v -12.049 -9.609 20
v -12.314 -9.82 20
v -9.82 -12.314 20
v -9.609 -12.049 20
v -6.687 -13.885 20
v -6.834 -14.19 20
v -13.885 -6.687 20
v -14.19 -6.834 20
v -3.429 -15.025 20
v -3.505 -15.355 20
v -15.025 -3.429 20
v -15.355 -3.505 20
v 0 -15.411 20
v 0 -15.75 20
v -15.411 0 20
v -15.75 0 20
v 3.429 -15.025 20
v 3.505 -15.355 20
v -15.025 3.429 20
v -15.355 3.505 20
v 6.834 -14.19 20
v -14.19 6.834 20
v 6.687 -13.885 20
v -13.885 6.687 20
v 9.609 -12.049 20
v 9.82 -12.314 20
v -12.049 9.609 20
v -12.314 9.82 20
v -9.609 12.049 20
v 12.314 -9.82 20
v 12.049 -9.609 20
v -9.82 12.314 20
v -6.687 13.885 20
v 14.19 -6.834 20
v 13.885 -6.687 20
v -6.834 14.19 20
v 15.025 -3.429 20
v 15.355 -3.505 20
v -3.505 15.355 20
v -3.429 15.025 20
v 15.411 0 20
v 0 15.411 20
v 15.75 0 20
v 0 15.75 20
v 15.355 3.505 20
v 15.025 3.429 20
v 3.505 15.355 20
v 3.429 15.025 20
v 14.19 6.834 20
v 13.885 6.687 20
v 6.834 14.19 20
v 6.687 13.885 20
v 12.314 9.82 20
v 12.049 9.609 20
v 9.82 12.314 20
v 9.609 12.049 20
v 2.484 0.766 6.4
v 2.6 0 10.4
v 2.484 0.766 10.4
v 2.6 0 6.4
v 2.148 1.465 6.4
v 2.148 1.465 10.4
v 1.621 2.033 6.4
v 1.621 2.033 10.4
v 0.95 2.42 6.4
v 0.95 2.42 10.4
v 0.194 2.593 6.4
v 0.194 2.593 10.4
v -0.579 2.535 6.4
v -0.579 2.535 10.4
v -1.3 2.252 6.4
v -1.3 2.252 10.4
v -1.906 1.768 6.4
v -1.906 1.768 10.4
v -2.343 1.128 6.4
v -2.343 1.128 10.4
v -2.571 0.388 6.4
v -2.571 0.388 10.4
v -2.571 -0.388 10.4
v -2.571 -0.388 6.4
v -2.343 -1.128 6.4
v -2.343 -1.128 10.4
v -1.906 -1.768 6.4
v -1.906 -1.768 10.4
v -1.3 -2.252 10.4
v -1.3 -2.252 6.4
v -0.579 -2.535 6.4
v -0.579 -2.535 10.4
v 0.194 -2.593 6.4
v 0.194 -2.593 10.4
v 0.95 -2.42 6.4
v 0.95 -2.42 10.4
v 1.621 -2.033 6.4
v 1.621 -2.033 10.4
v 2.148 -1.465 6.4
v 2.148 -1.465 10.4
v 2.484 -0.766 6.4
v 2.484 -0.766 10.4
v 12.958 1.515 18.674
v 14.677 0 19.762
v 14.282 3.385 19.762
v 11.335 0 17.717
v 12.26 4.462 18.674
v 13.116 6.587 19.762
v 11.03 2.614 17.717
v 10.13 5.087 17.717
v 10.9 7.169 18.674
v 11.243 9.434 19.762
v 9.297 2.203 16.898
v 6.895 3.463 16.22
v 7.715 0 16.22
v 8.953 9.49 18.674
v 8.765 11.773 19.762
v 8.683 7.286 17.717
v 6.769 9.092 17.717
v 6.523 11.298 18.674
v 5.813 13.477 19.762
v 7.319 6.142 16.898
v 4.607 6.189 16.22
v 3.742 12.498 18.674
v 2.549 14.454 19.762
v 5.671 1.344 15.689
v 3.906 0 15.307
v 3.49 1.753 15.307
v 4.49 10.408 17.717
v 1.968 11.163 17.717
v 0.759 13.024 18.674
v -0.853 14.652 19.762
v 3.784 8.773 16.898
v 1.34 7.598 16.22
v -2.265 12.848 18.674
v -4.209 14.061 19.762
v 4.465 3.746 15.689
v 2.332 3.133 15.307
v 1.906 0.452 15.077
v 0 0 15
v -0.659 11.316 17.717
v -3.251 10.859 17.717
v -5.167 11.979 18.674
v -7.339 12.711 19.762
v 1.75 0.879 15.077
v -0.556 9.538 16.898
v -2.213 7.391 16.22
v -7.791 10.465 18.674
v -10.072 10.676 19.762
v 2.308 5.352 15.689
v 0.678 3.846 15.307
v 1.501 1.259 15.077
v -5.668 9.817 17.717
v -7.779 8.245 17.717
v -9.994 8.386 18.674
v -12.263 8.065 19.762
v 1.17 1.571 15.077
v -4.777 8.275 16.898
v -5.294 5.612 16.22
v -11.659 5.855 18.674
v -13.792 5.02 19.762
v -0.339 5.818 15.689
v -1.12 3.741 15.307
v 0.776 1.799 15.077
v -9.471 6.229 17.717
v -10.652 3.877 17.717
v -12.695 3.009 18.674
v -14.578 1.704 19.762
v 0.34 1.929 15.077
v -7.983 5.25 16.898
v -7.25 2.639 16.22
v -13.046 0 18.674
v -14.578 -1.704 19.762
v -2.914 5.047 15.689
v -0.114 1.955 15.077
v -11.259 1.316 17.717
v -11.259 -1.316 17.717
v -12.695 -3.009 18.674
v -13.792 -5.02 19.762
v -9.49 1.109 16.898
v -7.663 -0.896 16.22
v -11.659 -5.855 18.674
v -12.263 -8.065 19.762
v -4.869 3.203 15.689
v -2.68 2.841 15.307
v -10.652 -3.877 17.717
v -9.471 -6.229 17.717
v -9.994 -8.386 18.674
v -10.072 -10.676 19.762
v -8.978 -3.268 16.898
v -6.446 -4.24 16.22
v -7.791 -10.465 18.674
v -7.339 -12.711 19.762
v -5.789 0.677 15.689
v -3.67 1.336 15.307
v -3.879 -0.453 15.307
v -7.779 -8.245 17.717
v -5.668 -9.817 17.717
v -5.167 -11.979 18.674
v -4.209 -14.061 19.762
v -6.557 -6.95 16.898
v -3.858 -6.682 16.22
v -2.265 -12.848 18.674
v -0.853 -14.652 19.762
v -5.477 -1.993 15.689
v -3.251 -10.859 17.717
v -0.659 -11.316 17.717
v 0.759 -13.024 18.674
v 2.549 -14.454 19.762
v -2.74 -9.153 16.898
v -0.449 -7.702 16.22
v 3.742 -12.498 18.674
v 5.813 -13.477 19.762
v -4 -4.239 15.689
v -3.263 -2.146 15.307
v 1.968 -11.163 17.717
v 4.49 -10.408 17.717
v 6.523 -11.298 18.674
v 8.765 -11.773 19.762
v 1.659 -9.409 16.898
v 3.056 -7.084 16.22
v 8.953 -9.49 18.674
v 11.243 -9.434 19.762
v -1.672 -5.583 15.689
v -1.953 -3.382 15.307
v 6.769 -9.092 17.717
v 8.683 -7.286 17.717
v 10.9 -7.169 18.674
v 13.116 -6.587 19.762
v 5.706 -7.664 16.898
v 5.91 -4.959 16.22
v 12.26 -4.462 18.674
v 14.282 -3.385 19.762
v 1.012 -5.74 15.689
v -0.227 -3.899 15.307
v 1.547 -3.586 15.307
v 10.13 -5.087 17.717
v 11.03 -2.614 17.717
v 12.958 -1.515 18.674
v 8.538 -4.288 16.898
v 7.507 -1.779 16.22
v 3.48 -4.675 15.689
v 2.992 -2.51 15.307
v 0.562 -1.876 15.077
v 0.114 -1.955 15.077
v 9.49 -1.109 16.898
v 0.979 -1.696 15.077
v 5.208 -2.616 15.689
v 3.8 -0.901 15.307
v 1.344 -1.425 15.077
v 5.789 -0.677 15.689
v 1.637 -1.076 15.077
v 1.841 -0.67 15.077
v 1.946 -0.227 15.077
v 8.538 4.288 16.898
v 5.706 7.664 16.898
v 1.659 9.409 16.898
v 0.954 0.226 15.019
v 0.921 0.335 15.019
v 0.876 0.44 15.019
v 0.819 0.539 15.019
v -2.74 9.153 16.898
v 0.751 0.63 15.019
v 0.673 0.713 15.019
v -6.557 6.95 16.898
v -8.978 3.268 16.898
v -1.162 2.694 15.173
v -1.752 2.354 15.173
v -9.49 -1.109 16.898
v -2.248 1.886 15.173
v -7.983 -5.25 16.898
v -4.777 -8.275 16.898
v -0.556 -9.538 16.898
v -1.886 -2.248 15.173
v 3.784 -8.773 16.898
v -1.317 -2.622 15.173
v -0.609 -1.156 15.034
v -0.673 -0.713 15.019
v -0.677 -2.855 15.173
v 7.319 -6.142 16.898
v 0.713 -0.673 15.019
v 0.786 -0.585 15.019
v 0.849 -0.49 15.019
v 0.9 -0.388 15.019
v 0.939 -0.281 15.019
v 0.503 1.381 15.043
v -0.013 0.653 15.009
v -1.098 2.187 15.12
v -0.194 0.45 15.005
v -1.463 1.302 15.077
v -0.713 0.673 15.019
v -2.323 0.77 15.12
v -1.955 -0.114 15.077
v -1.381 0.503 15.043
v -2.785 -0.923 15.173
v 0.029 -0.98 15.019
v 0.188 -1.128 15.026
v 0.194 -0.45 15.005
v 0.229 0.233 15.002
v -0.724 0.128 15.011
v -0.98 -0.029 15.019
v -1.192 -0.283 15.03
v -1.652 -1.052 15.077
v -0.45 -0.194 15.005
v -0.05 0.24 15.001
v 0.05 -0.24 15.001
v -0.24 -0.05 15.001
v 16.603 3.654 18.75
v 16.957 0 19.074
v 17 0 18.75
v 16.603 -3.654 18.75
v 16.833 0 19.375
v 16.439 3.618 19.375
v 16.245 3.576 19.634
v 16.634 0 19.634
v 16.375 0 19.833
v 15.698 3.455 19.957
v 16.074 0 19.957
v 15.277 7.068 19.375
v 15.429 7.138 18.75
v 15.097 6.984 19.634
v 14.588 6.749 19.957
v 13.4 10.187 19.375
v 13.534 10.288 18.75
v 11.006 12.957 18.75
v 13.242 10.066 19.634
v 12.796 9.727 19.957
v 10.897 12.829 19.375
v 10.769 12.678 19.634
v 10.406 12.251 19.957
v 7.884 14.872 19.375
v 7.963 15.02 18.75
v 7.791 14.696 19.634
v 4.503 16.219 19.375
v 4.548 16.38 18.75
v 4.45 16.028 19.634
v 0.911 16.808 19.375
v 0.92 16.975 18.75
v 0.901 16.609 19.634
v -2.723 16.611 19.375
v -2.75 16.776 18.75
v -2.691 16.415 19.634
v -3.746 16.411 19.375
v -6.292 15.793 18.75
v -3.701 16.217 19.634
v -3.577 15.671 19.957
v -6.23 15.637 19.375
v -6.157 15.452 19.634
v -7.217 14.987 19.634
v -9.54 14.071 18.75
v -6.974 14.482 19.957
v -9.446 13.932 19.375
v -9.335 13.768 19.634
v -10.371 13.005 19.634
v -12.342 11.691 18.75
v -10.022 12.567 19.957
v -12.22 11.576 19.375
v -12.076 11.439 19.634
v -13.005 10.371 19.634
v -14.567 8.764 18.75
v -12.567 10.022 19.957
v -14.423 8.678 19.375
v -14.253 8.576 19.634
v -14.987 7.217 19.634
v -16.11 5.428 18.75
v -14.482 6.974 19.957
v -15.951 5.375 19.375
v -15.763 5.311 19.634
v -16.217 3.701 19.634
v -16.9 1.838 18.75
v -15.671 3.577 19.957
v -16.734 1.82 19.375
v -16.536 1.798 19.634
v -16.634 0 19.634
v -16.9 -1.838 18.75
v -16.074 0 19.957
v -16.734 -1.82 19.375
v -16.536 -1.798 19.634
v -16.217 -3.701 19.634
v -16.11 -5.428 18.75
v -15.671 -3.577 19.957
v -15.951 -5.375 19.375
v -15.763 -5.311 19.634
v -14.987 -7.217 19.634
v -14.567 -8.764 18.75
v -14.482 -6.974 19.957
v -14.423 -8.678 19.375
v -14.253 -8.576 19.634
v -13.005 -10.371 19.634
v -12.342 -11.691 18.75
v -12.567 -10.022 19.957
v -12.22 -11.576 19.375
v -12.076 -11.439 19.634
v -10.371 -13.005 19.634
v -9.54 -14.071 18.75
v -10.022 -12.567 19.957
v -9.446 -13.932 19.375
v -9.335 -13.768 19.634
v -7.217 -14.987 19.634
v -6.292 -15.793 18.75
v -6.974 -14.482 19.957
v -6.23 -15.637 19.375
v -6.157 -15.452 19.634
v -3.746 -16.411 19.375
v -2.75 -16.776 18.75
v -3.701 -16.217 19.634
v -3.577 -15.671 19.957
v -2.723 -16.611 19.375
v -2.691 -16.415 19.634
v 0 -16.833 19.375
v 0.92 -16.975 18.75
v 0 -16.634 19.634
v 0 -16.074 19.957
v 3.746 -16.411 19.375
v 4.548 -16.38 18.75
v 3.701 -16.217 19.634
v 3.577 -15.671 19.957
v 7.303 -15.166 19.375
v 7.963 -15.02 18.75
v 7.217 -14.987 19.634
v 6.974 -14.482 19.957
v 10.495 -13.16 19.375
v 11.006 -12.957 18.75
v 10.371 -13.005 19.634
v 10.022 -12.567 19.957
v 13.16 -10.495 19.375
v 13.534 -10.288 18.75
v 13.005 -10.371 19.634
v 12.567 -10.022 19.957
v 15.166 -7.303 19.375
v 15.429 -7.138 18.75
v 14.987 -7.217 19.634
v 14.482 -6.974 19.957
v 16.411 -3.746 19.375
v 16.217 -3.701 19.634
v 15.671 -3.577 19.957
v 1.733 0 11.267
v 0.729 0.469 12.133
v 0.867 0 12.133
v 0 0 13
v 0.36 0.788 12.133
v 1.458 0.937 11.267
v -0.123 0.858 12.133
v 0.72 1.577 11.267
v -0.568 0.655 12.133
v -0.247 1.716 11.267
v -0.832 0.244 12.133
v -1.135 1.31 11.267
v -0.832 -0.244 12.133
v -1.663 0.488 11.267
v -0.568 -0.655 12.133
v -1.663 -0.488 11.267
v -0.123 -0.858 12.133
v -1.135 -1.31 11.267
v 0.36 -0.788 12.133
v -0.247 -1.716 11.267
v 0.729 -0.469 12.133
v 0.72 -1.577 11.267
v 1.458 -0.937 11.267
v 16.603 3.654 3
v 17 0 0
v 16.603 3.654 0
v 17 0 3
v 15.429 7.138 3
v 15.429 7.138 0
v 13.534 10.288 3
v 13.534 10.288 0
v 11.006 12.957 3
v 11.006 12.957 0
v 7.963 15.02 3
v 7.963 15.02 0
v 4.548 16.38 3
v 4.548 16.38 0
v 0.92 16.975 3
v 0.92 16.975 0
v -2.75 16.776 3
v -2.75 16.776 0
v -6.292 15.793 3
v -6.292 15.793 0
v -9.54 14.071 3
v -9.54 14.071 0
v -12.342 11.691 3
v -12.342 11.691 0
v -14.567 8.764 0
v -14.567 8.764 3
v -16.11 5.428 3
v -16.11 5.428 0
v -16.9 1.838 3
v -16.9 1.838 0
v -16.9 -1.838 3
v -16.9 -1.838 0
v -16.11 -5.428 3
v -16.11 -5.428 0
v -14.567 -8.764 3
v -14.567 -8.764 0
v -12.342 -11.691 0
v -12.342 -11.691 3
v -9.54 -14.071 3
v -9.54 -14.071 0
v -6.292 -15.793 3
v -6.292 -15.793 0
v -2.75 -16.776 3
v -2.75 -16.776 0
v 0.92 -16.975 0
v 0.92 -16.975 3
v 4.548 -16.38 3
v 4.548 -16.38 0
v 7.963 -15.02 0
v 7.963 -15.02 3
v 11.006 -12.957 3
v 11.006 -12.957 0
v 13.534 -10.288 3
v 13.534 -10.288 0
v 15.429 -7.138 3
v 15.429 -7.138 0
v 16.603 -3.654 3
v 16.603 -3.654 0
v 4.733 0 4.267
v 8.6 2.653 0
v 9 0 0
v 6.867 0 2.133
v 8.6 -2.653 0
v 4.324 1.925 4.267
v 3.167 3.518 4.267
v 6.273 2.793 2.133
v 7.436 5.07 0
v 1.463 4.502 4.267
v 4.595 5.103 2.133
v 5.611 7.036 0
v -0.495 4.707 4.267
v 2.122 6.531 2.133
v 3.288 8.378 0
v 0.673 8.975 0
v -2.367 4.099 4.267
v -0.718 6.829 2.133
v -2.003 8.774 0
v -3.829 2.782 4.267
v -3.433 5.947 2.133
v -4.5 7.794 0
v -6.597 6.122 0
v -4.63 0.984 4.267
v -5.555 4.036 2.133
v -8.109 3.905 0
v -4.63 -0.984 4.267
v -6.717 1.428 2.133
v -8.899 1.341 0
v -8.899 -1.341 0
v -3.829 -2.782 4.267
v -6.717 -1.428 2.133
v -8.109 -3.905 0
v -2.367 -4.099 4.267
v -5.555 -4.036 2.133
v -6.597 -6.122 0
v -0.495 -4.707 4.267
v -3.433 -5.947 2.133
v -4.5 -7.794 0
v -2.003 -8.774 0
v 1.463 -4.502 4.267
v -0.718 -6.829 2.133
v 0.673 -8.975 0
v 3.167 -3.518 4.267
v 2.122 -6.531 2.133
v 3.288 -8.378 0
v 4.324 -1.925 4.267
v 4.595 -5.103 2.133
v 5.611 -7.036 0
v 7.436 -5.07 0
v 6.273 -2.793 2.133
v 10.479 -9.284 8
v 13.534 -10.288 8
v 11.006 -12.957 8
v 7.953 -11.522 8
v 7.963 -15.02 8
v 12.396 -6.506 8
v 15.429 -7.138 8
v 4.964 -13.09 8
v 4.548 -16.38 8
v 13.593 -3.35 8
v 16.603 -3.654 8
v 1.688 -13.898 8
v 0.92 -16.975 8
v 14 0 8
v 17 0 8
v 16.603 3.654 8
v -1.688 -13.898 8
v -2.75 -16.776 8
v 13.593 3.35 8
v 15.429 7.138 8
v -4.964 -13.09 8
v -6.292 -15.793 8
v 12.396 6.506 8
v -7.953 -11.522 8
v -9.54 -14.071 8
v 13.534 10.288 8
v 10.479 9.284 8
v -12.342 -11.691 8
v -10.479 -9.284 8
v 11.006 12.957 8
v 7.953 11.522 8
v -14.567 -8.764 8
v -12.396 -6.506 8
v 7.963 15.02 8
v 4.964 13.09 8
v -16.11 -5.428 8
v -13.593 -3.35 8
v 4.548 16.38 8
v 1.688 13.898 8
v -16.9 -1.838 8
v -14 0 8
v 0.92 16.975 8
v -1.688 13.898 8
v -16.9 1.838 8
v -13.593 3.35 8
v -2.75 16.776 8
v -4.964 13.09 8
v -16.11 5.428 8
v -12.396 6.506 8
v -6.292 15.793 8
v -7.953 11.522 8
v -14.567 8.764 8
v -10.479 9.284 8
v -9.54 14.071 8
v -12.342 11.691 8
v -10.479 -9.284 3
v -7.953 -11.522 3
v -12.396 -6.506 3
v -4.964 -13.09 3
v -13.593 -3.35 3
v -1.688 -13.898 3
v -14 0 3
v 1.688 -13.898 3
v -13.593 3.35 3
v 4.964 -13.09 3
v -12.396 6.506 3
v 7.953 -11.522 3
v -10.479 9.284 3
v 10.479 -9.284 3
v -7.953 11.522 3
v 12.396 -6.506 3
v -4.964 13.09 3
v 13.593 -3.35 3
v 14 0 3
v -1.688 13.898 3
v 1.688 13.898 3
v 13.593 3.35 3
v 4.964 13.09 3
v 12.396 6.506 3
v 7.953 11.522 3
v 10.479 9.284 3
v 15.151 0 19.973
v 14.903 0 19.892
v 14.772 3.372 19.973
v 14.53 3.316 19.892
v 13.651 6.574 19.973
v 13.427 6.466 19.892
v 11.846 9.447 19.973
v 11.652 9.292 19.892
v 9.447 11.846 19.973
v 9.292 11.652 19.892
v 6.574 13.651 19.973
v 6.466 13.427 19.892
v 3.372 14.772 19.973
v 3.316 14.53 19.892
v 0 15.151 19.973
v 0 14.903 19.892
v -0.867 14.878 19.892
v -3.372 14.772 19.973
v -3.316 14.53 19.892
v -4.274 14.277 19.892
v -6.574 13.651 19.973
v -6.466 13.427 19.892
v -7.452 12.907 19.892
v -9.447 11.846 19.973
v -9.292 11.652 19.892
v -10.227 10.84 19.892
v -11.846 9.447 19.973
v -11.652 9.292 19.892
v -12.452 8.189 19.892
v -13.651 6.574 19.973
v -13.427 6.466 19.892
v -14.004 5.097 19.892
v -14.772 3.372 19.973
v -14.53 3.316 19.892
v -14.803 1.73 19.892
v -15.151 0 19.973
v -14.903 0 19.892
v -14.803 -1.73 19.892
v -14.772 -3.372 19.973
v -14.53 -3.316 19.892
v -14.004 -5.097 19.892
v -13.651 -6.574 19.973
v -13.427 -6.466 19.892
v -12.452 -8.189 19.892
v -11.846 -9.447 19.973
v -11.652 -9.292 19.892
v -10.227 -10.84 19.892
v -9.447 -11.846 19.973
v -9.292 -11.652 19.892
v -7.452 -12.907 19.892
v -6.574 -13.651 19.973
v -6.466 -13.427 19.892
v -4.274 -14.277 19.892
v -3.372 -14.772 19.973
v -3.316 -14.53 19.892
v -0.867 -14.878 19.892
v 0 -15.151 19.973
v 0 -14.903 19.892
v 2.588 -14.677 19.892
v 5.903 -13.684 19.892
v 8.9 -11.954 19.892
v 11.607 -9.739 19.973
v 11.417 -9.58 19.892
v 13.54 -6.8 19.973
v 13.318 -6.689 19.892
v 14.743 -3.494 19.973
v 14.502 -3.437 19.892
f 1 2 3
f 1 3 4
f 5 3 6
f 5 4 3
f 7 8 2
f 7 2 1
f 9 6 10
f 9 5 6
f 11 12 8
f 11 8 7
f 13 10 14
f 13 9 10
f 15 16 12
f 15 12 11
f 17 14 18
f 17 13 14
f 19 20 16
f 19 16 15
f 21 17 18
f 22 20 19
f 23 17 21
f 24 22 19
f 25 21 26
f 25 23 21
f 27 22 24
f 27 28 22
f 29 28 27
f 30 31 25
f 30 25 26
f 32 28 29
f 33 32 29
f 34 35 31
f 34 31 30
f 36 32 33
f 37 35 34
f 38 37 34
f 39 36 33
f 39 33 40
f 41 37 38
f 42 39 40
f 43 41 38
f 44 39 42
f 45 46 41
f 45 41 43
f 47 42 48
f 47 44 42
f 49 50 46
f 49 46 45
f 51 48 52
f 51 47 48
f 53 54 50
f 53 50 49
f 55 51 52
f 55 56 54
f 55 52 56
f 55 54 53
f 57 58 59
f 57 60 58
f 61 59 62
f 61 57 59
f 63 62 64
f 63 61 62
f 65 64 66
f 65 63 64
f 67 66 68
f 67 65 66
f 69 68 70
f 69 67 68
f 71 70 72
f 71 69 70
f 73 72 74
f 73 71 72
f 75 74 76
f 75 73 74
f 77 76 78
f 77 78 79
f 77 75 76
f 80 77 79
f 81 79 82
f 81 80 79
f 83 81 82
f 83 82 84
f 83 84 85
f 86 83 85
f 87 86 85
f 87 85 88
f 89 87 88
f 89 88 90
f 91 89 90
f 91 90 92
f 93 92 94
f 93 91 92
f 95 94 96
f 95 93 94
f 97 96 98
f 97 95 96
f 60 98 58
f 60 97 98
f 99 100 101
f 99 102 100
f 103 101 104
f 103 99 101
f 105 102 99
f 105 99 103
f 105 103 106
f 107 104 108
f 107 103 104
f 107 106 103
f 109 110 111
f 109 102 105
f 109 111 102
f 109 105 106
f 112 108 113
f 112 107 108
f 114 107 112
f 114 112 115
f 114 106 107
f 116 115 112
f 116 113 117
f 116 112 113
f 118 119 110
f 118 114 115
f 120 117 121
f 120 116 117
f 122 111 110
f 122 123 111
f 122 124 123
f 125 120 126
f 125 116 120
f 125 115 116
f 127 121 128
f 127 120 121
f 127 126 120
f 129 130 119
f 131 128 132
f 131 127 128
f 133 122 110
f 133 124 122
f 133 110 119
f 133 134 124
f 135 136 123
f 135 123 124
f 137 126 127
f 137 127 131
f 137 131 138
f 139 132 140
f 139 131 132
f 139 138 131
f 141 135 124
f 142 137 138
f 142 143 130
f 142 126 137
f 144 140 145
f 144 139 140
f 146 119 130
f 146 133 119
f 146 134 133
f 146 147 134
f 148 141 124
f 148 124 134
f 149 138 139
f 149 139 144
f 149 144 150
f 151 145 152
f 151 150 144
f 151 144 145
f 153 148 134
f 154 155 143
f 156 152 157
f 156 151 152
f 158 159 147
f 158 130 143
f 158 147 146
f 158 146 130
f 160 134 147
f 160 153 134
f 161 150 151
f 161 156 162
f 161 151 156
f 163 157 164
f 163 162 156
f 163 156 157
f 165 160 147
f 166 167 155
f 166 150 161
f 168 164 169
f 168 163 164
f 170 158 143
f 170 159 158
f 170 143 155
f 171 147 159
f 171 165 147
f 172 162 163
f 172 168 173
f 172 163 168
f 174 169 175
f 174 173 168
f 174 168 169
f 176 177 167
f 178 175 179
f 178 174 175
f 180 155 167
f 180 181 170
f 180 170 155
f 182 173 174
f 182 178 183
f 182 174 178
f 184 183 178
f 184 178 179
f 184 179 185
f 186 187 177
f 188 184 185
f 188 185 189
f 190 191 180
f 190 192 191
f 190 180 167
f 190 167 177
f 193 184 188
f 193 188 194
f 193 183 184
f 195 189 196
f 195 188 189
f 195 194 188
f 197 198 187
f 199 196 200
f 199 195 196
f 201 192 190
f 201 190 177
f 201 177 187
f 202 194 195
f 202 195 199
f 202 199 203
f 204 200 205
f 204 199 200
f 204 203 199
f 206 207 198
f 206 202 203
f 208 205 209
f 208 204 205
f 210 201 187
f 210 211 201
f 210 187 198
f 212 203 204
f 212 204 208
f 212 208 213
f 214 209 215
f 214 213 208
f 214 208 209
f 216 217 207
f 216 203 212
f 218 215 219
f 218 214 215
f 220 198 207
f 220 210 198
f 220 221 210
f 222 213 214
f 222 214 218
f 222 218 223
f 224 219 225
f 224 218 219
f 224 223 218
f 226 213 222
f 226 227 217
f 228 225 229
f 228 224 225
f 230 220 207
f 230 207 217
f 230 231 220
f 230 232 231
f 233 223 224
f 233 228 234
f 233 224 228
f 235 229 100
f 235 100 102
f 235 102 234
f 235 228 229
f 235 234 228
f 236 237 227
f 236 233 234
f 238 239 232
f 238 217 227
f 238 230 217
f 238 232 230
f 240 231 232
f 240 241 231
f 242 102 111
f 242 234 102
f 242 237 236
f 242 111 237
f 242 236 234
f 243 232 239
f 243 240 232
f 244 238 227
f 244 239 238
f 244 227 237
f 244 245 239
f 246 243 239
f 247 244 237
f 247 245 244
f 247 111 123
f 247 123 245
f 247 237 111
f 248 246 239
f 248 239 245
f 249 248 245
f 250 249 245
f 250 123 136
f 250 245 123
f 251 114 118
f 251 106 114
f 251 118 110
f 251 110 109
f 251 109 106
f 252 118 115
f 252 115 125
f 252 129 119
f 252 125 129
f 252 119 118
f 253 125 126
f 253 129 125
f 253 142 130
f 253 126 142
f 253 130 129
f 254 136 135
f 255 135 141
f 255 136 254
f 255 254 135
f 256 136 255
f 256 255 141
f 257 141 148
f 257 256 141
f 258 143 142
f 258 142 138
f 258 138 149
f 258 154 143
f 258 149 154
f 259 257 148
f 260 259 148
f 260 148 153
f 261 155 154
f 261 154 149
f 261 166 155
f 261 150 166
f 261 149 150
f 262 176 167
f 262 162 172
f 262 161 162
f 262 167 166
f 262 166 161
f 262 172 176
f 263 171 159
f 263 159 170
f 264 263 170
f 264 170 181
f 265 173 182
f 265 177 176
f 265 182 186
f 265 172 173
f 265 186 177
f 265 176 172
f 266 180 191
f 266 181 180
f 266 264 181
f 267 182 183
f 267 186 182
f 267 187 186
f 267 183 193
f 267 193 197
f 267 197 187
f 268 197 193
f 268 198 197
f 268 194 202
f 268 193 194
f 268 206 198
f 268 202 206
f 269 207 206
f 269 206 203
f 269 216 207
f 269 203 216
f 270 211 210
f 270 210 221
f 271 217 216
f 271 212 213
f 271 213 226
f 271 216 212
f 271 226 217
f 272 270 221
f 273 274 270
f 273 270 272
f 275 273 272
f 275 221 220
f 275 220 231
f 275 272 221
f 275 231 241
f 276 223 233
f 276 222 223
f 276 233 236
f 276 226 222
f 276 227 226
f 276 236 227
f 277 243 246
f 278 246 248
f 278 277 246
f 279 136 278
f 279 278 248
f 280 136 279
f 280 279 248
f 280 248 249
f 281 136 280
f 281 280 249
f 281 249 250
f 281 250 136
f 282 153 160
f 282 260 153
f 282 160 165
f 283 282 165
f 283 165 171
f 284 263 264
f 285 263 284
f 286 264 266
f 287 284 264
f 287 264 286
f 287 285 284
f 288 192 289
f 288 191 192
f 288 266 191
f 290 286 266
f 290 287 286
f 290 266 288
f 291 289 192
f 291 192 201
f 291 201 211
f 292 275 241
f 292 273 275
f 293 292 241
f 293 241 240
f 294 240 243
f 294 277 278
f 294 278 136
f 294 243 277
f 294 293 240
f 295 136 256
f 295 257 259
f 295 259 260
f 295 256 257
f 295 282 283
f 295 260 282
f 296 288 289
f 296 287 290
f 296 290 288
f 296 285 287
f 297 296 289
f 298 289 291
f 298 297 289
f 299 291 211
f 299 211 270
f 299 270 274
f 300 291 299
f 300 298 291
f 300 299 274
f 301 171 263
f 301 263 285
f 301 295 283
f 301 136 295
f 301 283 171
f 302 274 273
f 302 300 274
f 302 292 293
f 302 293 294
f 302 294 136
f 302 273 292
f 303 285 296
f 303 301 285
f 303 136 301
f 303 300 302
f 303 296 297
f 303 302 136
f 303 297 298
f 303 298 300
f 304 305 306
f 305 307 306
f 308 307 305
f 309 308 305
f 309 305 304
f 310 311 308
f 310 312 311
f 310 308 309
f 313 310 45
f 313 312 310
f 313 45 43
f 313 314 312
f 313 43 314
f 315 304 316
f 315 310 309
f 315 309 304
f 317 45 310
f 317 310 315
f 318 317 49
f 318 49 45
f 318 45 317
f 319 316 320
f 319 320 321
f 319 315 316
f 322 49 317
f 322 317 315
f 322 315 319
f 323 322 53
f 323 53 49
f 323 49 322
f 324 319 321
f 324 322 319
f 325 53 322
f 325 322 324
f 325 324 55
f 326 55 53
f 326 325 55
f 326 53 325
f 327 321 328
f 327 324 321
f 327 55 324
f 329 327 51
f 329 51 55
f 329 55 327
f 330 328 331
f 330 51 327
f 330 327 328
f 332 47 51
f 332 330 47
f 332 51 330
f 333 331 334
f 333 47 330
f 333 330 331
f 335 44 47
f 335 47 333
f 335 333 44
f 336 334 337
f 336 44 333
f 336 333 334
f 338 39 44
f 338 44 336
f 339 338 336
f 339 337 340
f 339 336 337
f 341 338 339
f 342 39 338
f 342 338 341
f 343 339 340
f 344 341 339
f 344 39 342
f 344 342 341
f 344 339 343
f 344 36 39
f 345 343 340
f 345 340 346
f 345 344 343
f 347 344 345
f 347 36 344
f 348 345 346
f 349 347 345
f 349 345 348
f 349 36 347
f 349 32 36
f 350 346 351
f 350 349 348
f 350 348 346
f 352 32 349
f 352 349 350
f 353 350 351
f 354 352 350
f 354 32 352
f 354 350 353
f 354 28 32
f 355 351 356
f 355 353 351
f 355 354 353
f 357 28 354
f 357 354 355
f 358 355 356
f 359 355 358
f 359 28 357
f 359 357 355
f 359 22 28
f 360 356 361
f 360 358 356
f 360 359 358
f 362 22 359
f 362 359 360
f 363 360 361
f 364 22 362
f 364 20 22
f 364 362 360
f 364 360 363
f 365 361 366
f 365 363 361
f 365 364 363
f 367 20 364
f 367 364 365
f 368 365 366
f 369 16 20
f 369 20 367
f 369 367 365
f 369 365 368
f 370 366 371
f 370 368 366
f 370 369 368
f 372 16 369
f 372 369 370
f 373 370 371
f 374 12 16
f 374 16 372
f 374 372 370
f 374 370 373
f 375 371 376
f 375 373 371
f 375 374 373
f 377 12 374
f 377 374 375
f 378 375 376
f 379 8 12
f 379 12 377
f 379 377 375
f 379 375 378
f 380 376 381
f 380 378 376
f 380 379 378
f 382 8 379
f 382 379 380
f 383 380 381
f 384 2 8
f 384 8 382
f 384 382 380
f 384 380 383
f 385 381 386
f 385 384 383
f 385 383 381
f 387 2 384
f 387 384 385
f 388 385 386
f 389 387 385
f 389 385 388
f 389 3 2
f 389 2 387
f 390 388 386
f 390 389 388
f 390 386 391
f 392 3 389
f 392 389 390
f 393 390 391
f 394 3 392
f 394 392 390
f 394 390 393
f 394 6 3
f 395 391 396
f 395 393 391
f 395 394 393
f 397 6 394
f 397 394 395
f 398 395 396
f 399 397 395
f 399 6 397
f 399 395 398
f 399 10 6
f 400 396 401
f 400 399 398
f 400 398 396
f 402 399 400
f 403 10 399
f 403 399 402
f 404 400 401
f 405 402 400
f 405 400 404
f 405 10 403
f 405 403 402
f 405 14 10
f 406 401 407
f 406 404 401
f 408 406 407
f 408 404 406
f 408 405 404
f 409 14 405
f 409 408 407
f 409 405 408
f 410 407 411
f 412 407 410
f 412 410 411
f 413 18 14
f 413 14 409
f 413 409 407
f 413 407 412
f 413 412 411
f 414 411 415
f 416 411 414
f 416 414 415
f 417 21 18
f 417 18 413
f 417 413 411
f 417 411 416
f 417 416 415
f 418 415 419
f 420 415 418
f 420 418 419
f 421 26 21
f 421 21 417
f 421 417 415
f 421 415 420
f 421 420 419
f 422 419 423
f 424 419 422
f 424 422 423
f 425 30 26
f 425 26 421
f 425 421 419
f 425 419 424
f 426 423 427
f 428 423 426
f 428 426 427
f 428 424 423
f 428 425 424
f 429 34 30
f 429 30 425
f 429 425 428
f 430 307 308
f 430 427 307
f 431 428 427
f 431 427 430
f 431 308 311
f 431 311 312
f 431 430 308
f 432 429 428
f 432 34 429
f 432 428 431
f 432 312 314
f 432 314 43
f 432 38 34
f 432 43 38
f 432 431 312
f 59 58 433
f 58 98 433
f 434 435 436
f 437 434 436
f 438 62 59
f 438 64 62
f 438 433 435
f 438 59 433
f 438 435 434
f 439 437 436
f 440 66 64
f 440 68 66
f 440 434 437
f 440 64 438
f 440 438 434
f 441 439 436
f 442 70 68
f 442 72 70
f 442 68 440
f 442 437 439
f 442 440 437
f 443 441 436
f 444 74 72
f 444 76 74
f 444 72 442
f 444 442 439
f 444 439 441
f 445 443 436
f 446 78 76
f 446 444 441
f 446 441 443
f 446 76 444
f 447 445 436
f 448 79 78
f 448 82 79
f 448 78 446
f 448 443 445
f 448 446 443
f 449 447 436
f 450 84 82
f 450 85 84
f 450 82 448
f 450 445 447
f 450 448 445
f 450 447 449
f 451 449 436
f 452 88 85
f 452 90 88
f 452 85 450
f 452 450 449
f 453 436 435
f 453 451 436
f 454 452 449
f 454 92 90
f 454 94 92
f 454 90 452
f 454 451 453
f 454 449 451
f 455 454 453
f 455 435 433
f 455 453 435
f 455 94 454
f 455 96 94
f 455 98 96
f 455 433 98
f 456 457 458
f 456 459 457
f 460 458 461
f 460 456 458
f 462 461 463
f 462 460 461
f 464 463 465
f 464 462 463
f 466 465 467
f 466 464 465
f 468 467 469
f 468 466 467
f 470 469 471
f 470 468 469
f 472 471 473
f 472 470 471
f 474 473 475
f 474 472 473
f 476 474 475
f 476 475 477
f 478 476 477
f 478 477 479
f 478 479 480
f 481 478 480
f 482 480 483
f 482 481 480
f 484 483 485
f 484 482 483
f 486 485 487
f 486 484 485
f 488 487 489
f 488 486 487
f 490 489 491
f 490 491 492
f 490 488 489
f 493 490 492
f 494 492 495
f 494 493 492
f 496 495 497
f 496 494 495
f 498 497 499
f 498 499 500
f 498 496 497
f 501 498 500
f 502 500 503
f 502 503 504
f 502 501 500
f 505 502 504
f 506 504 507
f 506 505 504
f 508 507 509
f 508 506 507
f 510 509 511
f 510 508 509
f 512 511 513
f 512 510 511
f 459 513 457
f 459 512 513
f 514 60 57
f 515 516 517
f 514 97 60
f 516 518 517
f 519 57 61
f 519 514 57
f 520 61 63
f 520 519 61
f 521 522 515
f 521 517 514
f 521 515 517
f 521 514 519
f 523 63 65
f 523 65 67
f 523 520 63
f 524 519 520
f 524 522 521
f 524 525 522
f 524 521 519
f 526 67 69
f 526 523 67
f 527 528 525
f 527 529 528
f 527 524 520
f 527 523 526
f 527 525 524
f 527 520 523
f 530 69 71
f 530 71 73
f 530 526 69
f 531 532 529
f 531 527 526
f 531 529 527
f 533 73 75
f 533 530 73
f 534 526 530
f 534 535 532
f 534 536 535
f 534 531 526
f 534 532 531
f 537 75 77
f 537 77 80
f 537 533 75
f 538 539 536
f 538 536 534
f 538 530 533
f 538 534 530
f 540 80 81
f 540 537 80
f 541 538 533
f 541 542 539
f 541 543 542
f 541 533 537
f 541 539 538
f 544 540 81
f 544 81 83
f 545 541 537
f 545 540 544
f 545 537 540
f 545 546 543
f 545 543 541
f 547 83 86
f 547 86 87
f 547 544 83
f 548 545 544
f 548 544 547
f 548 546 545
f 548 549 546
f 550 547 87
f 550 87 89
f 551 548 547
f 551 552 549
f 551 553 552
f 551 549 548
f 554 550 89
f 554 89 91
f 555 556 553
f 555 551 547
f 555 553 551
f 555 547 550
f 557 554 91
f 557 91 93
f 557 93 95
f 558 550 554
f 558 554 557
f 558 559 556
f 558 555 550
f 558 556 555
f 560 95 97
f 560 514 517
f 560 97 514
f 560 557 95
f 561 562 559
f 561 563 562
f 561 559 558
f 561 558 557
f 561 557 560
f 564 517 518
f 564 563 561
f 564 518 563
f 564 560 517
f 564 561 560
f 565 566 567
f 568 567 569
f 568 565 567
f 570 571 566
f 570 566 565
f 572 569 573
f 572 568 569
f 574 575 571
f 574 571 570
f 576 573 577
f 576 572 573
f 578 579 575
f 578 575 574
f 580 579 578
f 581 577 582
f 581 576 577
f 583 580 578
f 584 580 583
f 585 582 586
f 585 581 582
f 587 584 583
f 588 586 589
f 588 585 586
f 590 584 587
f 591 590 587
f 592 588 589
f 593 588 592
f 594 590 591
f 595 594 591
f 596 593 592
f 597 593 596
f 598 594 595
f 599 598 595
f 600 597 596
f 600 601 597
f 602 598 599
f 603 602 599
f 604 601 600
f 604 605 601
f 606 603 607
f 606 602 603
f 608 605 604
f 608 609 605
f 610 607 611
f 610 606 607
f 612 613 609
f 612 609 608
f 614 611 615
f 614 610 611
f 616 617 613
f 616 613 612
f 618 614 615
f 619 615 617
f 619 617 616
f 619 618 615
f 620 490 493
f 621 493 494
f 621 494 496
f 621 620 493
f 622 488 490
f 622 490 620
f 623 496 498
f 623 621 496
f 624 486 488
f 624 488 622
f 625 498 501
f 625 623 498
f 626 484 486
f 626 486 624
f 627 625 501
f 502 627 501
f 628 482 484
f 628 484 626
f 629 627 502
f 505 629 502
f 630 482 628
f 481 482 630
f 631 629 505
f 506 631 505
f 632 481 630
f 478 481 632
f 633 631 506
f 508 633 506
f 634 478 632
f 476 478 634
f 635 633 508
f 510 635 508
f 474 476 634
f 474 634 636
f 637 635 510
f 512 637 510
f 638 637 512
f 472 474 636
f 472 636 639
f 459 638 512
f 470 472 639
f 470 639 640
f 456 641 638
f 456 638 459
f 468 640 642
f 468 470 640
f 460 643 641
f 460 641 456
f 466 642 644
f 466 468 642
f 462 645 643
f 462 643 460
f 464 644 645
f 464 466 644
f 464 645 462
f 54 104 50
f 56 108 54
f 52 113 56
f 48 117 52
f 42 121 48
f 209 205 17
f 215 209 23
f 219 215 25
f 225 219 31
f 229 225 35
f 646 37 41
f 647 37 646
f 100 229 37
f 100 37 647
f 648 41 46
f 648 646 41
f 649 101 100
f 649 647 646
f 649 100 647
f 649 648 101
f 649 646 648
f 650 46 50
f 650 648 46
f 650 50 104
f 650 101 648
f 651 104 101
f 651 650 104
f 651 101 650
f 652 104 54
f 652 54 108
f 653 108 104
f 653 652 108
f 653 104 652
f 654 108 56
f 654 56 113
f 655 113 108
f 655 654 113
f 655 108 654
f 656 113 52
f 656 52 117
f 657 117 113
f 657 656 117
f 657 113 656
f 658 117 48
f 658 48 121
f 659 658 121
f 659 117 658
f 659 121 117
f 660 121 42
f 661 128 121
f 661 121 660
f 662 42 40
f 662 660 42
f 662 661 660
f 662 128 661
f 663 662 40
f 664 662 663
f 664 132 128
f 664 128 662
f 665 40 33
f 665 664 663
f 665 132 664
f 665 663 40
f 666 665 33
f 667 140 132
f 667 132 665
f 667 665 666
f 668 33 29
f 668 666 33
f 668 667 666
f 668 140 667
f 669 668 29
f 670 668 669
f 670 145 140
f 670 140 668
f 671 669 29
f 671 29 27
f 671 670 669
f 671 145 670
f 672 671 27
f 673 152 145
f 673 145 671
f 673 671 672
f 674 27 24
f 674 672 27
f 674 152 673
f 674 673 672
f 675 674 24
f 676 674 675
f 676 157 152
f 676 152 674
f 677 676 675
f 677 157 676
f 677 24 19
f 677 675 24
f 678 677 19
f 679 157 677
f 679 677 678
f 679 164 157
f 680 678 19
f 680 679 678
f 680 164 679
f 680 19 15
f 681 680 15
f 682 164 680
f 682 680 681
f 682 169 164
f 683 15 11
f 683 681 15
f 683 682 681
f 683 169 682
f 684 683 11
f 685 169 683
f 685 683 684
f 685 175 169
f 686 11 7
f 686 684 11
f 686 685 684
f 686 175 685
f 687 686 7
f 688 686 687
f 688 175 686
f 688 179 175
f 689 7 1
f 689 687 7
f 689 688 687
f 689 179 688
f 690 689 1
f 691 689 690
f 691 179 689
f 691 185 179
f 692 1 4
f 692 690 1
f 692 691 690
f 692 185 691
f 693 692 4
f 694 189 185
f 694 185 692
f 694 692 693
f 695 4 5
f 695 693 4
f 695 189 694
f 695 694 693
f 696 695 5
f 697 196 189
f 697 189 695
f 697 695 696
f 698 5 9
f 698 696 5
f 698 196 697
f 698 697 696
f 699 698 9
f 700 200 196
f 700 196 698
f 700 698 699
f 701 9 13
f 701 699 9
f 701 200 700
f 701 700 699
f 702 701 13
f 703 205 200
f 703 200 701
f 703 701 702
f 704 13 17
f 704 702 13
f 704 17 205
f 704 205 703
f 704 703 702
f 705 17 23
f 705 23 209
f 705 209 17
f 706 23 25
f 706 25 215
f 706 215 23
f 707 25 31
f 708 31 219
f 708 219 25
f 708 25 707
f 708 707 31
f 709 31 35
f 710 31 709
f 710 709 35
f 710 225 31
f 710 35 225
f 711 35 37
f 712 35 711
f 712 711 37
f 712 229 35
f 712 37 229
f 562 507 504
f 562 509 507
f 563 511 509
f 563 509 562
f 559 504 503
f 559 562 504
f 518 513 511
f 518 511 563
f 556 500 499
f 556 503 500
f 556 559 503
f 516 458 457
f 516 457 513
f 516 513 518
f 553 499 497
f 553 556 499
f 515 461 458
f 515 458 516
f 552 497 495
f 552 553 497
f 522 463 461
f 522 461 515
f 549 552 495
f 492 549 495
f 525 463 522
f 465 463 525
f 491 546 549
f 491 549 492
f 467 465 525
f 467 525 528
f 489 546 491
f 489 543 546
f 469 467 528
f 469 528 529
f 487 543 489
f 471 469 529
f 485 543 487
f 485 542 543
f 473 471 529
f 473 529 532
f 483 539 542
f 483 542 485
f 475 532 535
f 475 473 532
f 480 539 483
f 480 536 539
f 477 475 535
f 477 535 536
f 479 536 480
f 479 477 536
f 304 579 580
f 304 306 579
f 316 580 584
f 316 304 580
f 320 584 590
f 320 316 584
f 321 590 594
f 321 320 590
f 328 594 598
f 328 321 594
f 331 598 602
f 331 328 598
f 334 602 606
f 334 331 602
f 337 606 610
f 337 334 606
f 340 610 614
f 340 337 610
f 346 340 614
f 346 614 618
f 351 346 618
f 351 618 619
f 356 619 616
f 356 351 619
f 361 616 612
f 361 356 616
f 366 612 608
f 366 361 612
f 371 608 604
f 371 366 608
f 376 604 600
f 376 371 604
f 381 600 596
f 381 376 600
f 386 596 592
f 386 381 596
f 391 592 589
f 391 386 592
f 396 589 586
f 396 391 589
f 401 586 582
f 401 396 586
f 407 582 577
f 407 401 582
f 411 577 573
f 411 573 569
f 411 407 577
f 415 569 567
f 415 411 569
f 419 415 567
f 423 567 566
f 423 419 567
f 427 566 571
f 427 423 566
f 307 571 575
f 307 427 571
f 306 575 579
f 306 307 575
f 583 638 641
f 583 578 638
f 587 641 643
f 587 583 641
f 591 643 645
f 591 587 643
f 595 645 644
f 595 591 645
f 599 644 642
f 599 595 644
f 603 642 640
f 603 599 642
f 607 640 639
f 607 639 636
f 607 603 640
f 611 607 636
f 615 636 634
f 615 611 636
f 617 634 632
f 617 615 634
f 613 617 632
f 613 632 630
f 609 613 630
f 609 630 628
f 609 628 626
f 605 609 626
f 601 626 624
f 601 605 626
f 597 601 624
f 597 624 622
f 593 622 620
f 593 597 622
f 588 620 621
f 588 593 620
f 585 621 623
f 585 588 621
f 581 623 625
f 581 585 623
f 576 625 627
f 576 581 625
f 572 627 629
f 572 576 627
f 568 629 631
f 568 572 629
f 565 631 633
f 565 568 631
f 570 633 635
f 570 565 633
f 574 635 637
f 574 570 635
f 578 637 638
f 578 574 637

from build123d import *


with BuildPart() as f1:
    # F0 (on Front) → F1 (revolve)
    with BuildSketch(Plane.XZ):
        with BuildLine():
            ThreePointArc((14.677176, 19.761905), (7.715167, 16.220257), (0, 15))
            Line((0, 15), (0, 13))
            Line((0, 13), (2.6, 10.4))
            Line((2.6, 10.4), (2.6, 6.4))
            Line((2.6, 6.4), (9, 0))
            Line((9, 0), (17, 0))
            Line((17, 0), (17, 3))
            Line((17, 3), (14, 3))
            Line((14, 3), (14, 8))
            Line((14, 8), (17, 8))
            Line((17, 8), (17, 18.75))
            ThreePointArc((17, 18.75), (16.633883, 19.633883), (15.75, 20))
            Line((15.75, 20), (15.411035, 20))
            ThreePointArc((15.411035, 20), (15.025277, 19.938987), (14.677176, 19.761905))
        make_face()
    revolve(axis=Axis((0, 0, 7.5), (0, 0, 1)))


solid = f1.part
